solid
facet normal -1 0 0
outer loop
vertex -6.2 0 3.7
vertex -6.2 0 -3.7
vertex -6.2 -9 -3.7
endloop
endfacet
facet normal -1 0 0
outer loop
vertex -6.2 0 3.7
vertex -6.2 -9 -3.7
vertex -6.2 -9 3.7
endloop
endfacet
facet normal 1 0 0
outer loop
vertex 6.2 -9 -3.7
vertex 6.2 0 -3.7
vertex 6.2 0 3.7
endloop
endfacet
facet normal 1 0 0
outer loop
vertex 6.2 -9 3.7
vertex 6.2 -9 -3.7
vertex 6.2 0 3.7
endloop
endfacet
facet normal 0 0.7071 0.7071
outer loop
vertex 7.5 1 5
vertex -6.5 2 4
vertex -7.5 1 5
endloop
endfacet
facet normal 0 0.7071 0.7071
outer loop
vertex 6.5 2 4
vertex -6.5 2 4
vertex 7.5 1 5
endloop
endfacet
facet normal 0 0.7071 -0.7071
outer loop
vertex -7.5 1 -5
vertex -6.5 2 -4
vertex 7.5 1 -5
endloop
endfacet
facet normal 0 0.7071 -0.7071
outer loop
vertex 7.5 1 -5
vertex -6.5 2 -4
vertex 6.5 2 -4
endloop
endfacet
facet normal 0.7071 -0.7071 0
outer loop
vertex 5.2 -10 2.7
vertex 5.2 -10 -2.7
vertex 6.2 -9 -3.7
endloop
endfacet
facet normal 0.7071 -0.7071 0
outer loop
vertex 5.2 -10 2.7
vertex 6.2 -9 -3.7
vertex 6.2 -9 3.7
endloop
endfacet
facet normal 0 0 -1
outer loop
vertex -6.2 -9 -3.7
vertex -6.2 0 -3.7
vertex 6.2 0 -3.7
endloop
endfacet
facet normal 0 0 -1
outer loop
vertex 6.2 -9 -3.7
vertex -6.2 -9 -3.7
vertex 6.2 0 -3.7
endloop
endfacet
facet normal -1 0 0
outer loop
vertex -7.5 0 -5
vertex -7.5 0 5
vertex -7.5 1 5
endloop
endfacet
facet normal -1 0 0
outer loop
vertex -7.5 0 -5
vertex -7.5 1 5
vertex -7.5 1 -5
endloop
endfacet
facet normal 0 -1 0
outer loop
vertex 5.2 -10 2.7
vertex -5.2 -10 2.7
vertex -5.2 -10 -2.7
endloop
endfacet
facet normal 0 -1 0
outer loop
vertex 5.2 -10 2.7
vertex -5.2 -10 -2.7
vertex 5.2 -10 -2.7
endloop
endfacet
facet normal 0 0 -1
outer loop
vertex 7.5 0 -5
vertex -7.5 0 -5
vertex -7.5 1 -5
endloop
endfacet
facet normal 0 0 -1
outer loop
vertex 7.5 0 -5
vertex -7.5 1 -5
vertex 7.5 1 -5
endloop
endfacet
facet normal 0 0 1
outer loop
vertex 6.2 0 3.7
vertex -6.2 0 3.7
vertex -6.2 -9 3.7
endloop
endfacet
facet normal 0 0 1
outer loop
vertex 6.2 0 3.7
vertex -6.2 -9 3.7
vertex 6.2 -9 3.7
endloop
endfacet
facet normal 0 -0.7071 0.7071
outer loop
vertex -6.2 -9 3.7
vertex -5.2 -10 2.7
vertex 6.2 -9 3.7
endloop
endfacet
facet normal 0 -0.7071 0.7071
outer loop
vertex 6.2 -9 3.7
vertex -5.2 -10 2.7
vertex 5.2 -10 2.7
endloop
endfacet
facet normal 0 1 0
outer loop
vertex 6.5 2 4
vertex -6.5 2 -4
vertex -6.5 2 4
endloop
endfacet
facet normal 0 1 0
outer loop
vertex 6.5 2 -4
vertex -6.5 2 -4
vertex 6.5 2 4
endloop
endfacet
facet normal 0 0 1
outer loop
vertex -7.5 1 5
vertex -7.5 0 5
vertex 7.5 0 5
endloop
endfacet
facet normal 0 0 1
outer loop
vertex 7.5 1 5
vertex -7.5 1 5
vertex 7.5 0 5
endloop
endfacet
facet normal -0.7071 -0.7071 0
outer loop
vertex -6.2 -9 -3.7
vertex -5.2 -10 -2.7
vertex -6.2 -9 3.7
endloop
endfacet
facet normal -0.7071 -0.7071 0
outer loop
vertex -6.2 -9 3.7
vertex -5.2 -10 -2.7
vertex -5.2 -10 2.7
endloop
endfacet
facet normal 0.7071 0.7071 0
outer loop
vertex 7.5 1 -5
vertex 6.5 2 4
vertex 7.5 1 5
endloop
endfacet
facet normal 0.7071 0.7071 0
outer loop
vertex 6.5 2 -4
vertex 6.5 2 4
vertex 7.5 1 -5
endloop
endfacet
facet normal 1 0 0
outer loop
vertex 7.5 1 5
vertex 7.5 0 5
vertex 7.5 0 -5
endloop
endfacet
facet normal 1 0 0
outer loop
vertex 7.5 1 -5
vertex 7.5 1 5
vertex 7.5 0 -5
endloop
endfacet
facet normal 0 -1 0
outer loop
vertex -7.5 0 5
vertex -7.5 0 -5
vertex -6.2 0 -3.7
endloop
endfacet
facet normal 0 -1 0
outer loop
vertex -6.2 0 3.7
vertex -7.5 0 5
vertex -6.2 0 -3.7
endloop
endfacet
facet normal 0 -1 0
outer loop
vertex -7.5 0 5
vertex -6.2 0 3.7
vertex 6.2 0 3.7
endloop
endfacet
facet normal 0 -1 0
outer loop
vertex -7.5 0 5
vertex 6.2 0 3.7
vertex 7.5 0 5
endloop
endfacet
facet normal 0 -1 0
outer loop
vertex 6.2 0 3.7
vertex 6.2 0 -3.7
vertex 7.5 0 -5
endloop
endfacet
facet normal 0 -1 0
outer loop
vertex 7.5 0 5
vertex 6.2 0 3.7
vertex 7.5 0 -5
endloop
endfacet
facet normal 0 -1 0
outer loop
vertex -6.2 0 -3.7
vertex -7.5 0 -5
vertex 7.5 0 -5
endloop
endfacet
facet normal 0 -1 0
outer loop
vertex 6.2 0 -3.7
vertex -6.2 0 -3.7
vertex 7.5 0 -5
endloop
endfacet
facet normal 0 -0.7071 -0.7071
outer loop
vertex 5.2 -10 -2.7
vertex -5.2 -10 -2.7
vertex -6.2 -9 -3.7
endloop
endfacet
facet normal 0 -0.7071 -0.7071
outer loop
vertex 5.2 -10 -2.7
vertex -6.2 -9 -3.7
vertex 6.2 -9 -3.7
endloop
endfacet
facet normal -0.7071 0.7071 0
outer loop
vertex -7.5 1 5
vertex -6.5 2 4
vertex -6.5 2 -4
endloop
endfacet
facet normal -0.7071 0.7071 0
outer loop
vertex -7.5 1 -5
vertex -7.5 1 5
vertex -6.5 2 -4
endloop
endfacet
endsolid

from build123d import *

# Parameters (mm, degrees)
SKETCH_1_W      = 15
SKETCH_1_H      = 10
SKETCH_1_W_2    = 12.4
SKETCH_1_H_2    = 7.4
EXTRUDE_1_DEPTH = 2
SKETCH_2_W      = 12.4
SKETCH_2_H      = 7.4
EXTRUDE_2_DEPTH = 10
CHAMFER_1_SIZE  = 1
CHAMFER_2_SIZE  = 1


with BuildPart() as part:
    # ｽｹｯﾁ1 → ﾎﾞｽ - 押し出し1 (new body)
    # profile 1 of 2: a face of its own
    with BuildSketch(Plane(origin=(0, 0, 0), x_dir=(1, 0, 0), z_dir=(0, 1, 0))):
        Rectangle(SKETCH_1_W, SKETCH_1_H)
        Rectangle(SKETCH_1_W_2, SKETCH_1_H_2, mode=Mode.SUBTRACT)
    # profile 2 of 2: a face of its own
    with BuildSketch(Plane(origin=(0, 0, 0), x_dir=(1, 0, 0), z_dir=(0, 1, 0))):
        Rectangle(SKETCH_1_W_2, SKETCH_1_H_2)
    extrude(amount=EXTRUDE_1_DEPTH)

    # ｽｹｯﾁ2 → ﾎﾞｽ - 押し出し2 (add)
    with BuildSketch(Plane.XZ):
        Rectangle(SKETCH_2_W, SKETCH_2_H)
    extrude(amount=EXTRUDE_2_DEPTH)

    # 面取り1
    chamfer_1_edges = [part.edges().sort_by_distance(p)[0] for p in [
        (0, -10, 3.7),
        (-6.2, -10, 0),
        (0, -10, -3.7),
        (6.2, -10, 0),
    ]]
    chamfer(chamfer_1_edges, length=CHAMFER_1_SIZE)

    # 面取り2
    chamfer_2_edges = [part.edges().sort_by_distance(p)[0] for p in [
        (0, 2, -5),
        (-7.5, 2, 0),
        (0, 2, 5),
        (7.5, 2, 0),
    ]]
    chamfer(chamfer_2_edges, length=CHAMFER_2_SIZE)


solid = part.part
